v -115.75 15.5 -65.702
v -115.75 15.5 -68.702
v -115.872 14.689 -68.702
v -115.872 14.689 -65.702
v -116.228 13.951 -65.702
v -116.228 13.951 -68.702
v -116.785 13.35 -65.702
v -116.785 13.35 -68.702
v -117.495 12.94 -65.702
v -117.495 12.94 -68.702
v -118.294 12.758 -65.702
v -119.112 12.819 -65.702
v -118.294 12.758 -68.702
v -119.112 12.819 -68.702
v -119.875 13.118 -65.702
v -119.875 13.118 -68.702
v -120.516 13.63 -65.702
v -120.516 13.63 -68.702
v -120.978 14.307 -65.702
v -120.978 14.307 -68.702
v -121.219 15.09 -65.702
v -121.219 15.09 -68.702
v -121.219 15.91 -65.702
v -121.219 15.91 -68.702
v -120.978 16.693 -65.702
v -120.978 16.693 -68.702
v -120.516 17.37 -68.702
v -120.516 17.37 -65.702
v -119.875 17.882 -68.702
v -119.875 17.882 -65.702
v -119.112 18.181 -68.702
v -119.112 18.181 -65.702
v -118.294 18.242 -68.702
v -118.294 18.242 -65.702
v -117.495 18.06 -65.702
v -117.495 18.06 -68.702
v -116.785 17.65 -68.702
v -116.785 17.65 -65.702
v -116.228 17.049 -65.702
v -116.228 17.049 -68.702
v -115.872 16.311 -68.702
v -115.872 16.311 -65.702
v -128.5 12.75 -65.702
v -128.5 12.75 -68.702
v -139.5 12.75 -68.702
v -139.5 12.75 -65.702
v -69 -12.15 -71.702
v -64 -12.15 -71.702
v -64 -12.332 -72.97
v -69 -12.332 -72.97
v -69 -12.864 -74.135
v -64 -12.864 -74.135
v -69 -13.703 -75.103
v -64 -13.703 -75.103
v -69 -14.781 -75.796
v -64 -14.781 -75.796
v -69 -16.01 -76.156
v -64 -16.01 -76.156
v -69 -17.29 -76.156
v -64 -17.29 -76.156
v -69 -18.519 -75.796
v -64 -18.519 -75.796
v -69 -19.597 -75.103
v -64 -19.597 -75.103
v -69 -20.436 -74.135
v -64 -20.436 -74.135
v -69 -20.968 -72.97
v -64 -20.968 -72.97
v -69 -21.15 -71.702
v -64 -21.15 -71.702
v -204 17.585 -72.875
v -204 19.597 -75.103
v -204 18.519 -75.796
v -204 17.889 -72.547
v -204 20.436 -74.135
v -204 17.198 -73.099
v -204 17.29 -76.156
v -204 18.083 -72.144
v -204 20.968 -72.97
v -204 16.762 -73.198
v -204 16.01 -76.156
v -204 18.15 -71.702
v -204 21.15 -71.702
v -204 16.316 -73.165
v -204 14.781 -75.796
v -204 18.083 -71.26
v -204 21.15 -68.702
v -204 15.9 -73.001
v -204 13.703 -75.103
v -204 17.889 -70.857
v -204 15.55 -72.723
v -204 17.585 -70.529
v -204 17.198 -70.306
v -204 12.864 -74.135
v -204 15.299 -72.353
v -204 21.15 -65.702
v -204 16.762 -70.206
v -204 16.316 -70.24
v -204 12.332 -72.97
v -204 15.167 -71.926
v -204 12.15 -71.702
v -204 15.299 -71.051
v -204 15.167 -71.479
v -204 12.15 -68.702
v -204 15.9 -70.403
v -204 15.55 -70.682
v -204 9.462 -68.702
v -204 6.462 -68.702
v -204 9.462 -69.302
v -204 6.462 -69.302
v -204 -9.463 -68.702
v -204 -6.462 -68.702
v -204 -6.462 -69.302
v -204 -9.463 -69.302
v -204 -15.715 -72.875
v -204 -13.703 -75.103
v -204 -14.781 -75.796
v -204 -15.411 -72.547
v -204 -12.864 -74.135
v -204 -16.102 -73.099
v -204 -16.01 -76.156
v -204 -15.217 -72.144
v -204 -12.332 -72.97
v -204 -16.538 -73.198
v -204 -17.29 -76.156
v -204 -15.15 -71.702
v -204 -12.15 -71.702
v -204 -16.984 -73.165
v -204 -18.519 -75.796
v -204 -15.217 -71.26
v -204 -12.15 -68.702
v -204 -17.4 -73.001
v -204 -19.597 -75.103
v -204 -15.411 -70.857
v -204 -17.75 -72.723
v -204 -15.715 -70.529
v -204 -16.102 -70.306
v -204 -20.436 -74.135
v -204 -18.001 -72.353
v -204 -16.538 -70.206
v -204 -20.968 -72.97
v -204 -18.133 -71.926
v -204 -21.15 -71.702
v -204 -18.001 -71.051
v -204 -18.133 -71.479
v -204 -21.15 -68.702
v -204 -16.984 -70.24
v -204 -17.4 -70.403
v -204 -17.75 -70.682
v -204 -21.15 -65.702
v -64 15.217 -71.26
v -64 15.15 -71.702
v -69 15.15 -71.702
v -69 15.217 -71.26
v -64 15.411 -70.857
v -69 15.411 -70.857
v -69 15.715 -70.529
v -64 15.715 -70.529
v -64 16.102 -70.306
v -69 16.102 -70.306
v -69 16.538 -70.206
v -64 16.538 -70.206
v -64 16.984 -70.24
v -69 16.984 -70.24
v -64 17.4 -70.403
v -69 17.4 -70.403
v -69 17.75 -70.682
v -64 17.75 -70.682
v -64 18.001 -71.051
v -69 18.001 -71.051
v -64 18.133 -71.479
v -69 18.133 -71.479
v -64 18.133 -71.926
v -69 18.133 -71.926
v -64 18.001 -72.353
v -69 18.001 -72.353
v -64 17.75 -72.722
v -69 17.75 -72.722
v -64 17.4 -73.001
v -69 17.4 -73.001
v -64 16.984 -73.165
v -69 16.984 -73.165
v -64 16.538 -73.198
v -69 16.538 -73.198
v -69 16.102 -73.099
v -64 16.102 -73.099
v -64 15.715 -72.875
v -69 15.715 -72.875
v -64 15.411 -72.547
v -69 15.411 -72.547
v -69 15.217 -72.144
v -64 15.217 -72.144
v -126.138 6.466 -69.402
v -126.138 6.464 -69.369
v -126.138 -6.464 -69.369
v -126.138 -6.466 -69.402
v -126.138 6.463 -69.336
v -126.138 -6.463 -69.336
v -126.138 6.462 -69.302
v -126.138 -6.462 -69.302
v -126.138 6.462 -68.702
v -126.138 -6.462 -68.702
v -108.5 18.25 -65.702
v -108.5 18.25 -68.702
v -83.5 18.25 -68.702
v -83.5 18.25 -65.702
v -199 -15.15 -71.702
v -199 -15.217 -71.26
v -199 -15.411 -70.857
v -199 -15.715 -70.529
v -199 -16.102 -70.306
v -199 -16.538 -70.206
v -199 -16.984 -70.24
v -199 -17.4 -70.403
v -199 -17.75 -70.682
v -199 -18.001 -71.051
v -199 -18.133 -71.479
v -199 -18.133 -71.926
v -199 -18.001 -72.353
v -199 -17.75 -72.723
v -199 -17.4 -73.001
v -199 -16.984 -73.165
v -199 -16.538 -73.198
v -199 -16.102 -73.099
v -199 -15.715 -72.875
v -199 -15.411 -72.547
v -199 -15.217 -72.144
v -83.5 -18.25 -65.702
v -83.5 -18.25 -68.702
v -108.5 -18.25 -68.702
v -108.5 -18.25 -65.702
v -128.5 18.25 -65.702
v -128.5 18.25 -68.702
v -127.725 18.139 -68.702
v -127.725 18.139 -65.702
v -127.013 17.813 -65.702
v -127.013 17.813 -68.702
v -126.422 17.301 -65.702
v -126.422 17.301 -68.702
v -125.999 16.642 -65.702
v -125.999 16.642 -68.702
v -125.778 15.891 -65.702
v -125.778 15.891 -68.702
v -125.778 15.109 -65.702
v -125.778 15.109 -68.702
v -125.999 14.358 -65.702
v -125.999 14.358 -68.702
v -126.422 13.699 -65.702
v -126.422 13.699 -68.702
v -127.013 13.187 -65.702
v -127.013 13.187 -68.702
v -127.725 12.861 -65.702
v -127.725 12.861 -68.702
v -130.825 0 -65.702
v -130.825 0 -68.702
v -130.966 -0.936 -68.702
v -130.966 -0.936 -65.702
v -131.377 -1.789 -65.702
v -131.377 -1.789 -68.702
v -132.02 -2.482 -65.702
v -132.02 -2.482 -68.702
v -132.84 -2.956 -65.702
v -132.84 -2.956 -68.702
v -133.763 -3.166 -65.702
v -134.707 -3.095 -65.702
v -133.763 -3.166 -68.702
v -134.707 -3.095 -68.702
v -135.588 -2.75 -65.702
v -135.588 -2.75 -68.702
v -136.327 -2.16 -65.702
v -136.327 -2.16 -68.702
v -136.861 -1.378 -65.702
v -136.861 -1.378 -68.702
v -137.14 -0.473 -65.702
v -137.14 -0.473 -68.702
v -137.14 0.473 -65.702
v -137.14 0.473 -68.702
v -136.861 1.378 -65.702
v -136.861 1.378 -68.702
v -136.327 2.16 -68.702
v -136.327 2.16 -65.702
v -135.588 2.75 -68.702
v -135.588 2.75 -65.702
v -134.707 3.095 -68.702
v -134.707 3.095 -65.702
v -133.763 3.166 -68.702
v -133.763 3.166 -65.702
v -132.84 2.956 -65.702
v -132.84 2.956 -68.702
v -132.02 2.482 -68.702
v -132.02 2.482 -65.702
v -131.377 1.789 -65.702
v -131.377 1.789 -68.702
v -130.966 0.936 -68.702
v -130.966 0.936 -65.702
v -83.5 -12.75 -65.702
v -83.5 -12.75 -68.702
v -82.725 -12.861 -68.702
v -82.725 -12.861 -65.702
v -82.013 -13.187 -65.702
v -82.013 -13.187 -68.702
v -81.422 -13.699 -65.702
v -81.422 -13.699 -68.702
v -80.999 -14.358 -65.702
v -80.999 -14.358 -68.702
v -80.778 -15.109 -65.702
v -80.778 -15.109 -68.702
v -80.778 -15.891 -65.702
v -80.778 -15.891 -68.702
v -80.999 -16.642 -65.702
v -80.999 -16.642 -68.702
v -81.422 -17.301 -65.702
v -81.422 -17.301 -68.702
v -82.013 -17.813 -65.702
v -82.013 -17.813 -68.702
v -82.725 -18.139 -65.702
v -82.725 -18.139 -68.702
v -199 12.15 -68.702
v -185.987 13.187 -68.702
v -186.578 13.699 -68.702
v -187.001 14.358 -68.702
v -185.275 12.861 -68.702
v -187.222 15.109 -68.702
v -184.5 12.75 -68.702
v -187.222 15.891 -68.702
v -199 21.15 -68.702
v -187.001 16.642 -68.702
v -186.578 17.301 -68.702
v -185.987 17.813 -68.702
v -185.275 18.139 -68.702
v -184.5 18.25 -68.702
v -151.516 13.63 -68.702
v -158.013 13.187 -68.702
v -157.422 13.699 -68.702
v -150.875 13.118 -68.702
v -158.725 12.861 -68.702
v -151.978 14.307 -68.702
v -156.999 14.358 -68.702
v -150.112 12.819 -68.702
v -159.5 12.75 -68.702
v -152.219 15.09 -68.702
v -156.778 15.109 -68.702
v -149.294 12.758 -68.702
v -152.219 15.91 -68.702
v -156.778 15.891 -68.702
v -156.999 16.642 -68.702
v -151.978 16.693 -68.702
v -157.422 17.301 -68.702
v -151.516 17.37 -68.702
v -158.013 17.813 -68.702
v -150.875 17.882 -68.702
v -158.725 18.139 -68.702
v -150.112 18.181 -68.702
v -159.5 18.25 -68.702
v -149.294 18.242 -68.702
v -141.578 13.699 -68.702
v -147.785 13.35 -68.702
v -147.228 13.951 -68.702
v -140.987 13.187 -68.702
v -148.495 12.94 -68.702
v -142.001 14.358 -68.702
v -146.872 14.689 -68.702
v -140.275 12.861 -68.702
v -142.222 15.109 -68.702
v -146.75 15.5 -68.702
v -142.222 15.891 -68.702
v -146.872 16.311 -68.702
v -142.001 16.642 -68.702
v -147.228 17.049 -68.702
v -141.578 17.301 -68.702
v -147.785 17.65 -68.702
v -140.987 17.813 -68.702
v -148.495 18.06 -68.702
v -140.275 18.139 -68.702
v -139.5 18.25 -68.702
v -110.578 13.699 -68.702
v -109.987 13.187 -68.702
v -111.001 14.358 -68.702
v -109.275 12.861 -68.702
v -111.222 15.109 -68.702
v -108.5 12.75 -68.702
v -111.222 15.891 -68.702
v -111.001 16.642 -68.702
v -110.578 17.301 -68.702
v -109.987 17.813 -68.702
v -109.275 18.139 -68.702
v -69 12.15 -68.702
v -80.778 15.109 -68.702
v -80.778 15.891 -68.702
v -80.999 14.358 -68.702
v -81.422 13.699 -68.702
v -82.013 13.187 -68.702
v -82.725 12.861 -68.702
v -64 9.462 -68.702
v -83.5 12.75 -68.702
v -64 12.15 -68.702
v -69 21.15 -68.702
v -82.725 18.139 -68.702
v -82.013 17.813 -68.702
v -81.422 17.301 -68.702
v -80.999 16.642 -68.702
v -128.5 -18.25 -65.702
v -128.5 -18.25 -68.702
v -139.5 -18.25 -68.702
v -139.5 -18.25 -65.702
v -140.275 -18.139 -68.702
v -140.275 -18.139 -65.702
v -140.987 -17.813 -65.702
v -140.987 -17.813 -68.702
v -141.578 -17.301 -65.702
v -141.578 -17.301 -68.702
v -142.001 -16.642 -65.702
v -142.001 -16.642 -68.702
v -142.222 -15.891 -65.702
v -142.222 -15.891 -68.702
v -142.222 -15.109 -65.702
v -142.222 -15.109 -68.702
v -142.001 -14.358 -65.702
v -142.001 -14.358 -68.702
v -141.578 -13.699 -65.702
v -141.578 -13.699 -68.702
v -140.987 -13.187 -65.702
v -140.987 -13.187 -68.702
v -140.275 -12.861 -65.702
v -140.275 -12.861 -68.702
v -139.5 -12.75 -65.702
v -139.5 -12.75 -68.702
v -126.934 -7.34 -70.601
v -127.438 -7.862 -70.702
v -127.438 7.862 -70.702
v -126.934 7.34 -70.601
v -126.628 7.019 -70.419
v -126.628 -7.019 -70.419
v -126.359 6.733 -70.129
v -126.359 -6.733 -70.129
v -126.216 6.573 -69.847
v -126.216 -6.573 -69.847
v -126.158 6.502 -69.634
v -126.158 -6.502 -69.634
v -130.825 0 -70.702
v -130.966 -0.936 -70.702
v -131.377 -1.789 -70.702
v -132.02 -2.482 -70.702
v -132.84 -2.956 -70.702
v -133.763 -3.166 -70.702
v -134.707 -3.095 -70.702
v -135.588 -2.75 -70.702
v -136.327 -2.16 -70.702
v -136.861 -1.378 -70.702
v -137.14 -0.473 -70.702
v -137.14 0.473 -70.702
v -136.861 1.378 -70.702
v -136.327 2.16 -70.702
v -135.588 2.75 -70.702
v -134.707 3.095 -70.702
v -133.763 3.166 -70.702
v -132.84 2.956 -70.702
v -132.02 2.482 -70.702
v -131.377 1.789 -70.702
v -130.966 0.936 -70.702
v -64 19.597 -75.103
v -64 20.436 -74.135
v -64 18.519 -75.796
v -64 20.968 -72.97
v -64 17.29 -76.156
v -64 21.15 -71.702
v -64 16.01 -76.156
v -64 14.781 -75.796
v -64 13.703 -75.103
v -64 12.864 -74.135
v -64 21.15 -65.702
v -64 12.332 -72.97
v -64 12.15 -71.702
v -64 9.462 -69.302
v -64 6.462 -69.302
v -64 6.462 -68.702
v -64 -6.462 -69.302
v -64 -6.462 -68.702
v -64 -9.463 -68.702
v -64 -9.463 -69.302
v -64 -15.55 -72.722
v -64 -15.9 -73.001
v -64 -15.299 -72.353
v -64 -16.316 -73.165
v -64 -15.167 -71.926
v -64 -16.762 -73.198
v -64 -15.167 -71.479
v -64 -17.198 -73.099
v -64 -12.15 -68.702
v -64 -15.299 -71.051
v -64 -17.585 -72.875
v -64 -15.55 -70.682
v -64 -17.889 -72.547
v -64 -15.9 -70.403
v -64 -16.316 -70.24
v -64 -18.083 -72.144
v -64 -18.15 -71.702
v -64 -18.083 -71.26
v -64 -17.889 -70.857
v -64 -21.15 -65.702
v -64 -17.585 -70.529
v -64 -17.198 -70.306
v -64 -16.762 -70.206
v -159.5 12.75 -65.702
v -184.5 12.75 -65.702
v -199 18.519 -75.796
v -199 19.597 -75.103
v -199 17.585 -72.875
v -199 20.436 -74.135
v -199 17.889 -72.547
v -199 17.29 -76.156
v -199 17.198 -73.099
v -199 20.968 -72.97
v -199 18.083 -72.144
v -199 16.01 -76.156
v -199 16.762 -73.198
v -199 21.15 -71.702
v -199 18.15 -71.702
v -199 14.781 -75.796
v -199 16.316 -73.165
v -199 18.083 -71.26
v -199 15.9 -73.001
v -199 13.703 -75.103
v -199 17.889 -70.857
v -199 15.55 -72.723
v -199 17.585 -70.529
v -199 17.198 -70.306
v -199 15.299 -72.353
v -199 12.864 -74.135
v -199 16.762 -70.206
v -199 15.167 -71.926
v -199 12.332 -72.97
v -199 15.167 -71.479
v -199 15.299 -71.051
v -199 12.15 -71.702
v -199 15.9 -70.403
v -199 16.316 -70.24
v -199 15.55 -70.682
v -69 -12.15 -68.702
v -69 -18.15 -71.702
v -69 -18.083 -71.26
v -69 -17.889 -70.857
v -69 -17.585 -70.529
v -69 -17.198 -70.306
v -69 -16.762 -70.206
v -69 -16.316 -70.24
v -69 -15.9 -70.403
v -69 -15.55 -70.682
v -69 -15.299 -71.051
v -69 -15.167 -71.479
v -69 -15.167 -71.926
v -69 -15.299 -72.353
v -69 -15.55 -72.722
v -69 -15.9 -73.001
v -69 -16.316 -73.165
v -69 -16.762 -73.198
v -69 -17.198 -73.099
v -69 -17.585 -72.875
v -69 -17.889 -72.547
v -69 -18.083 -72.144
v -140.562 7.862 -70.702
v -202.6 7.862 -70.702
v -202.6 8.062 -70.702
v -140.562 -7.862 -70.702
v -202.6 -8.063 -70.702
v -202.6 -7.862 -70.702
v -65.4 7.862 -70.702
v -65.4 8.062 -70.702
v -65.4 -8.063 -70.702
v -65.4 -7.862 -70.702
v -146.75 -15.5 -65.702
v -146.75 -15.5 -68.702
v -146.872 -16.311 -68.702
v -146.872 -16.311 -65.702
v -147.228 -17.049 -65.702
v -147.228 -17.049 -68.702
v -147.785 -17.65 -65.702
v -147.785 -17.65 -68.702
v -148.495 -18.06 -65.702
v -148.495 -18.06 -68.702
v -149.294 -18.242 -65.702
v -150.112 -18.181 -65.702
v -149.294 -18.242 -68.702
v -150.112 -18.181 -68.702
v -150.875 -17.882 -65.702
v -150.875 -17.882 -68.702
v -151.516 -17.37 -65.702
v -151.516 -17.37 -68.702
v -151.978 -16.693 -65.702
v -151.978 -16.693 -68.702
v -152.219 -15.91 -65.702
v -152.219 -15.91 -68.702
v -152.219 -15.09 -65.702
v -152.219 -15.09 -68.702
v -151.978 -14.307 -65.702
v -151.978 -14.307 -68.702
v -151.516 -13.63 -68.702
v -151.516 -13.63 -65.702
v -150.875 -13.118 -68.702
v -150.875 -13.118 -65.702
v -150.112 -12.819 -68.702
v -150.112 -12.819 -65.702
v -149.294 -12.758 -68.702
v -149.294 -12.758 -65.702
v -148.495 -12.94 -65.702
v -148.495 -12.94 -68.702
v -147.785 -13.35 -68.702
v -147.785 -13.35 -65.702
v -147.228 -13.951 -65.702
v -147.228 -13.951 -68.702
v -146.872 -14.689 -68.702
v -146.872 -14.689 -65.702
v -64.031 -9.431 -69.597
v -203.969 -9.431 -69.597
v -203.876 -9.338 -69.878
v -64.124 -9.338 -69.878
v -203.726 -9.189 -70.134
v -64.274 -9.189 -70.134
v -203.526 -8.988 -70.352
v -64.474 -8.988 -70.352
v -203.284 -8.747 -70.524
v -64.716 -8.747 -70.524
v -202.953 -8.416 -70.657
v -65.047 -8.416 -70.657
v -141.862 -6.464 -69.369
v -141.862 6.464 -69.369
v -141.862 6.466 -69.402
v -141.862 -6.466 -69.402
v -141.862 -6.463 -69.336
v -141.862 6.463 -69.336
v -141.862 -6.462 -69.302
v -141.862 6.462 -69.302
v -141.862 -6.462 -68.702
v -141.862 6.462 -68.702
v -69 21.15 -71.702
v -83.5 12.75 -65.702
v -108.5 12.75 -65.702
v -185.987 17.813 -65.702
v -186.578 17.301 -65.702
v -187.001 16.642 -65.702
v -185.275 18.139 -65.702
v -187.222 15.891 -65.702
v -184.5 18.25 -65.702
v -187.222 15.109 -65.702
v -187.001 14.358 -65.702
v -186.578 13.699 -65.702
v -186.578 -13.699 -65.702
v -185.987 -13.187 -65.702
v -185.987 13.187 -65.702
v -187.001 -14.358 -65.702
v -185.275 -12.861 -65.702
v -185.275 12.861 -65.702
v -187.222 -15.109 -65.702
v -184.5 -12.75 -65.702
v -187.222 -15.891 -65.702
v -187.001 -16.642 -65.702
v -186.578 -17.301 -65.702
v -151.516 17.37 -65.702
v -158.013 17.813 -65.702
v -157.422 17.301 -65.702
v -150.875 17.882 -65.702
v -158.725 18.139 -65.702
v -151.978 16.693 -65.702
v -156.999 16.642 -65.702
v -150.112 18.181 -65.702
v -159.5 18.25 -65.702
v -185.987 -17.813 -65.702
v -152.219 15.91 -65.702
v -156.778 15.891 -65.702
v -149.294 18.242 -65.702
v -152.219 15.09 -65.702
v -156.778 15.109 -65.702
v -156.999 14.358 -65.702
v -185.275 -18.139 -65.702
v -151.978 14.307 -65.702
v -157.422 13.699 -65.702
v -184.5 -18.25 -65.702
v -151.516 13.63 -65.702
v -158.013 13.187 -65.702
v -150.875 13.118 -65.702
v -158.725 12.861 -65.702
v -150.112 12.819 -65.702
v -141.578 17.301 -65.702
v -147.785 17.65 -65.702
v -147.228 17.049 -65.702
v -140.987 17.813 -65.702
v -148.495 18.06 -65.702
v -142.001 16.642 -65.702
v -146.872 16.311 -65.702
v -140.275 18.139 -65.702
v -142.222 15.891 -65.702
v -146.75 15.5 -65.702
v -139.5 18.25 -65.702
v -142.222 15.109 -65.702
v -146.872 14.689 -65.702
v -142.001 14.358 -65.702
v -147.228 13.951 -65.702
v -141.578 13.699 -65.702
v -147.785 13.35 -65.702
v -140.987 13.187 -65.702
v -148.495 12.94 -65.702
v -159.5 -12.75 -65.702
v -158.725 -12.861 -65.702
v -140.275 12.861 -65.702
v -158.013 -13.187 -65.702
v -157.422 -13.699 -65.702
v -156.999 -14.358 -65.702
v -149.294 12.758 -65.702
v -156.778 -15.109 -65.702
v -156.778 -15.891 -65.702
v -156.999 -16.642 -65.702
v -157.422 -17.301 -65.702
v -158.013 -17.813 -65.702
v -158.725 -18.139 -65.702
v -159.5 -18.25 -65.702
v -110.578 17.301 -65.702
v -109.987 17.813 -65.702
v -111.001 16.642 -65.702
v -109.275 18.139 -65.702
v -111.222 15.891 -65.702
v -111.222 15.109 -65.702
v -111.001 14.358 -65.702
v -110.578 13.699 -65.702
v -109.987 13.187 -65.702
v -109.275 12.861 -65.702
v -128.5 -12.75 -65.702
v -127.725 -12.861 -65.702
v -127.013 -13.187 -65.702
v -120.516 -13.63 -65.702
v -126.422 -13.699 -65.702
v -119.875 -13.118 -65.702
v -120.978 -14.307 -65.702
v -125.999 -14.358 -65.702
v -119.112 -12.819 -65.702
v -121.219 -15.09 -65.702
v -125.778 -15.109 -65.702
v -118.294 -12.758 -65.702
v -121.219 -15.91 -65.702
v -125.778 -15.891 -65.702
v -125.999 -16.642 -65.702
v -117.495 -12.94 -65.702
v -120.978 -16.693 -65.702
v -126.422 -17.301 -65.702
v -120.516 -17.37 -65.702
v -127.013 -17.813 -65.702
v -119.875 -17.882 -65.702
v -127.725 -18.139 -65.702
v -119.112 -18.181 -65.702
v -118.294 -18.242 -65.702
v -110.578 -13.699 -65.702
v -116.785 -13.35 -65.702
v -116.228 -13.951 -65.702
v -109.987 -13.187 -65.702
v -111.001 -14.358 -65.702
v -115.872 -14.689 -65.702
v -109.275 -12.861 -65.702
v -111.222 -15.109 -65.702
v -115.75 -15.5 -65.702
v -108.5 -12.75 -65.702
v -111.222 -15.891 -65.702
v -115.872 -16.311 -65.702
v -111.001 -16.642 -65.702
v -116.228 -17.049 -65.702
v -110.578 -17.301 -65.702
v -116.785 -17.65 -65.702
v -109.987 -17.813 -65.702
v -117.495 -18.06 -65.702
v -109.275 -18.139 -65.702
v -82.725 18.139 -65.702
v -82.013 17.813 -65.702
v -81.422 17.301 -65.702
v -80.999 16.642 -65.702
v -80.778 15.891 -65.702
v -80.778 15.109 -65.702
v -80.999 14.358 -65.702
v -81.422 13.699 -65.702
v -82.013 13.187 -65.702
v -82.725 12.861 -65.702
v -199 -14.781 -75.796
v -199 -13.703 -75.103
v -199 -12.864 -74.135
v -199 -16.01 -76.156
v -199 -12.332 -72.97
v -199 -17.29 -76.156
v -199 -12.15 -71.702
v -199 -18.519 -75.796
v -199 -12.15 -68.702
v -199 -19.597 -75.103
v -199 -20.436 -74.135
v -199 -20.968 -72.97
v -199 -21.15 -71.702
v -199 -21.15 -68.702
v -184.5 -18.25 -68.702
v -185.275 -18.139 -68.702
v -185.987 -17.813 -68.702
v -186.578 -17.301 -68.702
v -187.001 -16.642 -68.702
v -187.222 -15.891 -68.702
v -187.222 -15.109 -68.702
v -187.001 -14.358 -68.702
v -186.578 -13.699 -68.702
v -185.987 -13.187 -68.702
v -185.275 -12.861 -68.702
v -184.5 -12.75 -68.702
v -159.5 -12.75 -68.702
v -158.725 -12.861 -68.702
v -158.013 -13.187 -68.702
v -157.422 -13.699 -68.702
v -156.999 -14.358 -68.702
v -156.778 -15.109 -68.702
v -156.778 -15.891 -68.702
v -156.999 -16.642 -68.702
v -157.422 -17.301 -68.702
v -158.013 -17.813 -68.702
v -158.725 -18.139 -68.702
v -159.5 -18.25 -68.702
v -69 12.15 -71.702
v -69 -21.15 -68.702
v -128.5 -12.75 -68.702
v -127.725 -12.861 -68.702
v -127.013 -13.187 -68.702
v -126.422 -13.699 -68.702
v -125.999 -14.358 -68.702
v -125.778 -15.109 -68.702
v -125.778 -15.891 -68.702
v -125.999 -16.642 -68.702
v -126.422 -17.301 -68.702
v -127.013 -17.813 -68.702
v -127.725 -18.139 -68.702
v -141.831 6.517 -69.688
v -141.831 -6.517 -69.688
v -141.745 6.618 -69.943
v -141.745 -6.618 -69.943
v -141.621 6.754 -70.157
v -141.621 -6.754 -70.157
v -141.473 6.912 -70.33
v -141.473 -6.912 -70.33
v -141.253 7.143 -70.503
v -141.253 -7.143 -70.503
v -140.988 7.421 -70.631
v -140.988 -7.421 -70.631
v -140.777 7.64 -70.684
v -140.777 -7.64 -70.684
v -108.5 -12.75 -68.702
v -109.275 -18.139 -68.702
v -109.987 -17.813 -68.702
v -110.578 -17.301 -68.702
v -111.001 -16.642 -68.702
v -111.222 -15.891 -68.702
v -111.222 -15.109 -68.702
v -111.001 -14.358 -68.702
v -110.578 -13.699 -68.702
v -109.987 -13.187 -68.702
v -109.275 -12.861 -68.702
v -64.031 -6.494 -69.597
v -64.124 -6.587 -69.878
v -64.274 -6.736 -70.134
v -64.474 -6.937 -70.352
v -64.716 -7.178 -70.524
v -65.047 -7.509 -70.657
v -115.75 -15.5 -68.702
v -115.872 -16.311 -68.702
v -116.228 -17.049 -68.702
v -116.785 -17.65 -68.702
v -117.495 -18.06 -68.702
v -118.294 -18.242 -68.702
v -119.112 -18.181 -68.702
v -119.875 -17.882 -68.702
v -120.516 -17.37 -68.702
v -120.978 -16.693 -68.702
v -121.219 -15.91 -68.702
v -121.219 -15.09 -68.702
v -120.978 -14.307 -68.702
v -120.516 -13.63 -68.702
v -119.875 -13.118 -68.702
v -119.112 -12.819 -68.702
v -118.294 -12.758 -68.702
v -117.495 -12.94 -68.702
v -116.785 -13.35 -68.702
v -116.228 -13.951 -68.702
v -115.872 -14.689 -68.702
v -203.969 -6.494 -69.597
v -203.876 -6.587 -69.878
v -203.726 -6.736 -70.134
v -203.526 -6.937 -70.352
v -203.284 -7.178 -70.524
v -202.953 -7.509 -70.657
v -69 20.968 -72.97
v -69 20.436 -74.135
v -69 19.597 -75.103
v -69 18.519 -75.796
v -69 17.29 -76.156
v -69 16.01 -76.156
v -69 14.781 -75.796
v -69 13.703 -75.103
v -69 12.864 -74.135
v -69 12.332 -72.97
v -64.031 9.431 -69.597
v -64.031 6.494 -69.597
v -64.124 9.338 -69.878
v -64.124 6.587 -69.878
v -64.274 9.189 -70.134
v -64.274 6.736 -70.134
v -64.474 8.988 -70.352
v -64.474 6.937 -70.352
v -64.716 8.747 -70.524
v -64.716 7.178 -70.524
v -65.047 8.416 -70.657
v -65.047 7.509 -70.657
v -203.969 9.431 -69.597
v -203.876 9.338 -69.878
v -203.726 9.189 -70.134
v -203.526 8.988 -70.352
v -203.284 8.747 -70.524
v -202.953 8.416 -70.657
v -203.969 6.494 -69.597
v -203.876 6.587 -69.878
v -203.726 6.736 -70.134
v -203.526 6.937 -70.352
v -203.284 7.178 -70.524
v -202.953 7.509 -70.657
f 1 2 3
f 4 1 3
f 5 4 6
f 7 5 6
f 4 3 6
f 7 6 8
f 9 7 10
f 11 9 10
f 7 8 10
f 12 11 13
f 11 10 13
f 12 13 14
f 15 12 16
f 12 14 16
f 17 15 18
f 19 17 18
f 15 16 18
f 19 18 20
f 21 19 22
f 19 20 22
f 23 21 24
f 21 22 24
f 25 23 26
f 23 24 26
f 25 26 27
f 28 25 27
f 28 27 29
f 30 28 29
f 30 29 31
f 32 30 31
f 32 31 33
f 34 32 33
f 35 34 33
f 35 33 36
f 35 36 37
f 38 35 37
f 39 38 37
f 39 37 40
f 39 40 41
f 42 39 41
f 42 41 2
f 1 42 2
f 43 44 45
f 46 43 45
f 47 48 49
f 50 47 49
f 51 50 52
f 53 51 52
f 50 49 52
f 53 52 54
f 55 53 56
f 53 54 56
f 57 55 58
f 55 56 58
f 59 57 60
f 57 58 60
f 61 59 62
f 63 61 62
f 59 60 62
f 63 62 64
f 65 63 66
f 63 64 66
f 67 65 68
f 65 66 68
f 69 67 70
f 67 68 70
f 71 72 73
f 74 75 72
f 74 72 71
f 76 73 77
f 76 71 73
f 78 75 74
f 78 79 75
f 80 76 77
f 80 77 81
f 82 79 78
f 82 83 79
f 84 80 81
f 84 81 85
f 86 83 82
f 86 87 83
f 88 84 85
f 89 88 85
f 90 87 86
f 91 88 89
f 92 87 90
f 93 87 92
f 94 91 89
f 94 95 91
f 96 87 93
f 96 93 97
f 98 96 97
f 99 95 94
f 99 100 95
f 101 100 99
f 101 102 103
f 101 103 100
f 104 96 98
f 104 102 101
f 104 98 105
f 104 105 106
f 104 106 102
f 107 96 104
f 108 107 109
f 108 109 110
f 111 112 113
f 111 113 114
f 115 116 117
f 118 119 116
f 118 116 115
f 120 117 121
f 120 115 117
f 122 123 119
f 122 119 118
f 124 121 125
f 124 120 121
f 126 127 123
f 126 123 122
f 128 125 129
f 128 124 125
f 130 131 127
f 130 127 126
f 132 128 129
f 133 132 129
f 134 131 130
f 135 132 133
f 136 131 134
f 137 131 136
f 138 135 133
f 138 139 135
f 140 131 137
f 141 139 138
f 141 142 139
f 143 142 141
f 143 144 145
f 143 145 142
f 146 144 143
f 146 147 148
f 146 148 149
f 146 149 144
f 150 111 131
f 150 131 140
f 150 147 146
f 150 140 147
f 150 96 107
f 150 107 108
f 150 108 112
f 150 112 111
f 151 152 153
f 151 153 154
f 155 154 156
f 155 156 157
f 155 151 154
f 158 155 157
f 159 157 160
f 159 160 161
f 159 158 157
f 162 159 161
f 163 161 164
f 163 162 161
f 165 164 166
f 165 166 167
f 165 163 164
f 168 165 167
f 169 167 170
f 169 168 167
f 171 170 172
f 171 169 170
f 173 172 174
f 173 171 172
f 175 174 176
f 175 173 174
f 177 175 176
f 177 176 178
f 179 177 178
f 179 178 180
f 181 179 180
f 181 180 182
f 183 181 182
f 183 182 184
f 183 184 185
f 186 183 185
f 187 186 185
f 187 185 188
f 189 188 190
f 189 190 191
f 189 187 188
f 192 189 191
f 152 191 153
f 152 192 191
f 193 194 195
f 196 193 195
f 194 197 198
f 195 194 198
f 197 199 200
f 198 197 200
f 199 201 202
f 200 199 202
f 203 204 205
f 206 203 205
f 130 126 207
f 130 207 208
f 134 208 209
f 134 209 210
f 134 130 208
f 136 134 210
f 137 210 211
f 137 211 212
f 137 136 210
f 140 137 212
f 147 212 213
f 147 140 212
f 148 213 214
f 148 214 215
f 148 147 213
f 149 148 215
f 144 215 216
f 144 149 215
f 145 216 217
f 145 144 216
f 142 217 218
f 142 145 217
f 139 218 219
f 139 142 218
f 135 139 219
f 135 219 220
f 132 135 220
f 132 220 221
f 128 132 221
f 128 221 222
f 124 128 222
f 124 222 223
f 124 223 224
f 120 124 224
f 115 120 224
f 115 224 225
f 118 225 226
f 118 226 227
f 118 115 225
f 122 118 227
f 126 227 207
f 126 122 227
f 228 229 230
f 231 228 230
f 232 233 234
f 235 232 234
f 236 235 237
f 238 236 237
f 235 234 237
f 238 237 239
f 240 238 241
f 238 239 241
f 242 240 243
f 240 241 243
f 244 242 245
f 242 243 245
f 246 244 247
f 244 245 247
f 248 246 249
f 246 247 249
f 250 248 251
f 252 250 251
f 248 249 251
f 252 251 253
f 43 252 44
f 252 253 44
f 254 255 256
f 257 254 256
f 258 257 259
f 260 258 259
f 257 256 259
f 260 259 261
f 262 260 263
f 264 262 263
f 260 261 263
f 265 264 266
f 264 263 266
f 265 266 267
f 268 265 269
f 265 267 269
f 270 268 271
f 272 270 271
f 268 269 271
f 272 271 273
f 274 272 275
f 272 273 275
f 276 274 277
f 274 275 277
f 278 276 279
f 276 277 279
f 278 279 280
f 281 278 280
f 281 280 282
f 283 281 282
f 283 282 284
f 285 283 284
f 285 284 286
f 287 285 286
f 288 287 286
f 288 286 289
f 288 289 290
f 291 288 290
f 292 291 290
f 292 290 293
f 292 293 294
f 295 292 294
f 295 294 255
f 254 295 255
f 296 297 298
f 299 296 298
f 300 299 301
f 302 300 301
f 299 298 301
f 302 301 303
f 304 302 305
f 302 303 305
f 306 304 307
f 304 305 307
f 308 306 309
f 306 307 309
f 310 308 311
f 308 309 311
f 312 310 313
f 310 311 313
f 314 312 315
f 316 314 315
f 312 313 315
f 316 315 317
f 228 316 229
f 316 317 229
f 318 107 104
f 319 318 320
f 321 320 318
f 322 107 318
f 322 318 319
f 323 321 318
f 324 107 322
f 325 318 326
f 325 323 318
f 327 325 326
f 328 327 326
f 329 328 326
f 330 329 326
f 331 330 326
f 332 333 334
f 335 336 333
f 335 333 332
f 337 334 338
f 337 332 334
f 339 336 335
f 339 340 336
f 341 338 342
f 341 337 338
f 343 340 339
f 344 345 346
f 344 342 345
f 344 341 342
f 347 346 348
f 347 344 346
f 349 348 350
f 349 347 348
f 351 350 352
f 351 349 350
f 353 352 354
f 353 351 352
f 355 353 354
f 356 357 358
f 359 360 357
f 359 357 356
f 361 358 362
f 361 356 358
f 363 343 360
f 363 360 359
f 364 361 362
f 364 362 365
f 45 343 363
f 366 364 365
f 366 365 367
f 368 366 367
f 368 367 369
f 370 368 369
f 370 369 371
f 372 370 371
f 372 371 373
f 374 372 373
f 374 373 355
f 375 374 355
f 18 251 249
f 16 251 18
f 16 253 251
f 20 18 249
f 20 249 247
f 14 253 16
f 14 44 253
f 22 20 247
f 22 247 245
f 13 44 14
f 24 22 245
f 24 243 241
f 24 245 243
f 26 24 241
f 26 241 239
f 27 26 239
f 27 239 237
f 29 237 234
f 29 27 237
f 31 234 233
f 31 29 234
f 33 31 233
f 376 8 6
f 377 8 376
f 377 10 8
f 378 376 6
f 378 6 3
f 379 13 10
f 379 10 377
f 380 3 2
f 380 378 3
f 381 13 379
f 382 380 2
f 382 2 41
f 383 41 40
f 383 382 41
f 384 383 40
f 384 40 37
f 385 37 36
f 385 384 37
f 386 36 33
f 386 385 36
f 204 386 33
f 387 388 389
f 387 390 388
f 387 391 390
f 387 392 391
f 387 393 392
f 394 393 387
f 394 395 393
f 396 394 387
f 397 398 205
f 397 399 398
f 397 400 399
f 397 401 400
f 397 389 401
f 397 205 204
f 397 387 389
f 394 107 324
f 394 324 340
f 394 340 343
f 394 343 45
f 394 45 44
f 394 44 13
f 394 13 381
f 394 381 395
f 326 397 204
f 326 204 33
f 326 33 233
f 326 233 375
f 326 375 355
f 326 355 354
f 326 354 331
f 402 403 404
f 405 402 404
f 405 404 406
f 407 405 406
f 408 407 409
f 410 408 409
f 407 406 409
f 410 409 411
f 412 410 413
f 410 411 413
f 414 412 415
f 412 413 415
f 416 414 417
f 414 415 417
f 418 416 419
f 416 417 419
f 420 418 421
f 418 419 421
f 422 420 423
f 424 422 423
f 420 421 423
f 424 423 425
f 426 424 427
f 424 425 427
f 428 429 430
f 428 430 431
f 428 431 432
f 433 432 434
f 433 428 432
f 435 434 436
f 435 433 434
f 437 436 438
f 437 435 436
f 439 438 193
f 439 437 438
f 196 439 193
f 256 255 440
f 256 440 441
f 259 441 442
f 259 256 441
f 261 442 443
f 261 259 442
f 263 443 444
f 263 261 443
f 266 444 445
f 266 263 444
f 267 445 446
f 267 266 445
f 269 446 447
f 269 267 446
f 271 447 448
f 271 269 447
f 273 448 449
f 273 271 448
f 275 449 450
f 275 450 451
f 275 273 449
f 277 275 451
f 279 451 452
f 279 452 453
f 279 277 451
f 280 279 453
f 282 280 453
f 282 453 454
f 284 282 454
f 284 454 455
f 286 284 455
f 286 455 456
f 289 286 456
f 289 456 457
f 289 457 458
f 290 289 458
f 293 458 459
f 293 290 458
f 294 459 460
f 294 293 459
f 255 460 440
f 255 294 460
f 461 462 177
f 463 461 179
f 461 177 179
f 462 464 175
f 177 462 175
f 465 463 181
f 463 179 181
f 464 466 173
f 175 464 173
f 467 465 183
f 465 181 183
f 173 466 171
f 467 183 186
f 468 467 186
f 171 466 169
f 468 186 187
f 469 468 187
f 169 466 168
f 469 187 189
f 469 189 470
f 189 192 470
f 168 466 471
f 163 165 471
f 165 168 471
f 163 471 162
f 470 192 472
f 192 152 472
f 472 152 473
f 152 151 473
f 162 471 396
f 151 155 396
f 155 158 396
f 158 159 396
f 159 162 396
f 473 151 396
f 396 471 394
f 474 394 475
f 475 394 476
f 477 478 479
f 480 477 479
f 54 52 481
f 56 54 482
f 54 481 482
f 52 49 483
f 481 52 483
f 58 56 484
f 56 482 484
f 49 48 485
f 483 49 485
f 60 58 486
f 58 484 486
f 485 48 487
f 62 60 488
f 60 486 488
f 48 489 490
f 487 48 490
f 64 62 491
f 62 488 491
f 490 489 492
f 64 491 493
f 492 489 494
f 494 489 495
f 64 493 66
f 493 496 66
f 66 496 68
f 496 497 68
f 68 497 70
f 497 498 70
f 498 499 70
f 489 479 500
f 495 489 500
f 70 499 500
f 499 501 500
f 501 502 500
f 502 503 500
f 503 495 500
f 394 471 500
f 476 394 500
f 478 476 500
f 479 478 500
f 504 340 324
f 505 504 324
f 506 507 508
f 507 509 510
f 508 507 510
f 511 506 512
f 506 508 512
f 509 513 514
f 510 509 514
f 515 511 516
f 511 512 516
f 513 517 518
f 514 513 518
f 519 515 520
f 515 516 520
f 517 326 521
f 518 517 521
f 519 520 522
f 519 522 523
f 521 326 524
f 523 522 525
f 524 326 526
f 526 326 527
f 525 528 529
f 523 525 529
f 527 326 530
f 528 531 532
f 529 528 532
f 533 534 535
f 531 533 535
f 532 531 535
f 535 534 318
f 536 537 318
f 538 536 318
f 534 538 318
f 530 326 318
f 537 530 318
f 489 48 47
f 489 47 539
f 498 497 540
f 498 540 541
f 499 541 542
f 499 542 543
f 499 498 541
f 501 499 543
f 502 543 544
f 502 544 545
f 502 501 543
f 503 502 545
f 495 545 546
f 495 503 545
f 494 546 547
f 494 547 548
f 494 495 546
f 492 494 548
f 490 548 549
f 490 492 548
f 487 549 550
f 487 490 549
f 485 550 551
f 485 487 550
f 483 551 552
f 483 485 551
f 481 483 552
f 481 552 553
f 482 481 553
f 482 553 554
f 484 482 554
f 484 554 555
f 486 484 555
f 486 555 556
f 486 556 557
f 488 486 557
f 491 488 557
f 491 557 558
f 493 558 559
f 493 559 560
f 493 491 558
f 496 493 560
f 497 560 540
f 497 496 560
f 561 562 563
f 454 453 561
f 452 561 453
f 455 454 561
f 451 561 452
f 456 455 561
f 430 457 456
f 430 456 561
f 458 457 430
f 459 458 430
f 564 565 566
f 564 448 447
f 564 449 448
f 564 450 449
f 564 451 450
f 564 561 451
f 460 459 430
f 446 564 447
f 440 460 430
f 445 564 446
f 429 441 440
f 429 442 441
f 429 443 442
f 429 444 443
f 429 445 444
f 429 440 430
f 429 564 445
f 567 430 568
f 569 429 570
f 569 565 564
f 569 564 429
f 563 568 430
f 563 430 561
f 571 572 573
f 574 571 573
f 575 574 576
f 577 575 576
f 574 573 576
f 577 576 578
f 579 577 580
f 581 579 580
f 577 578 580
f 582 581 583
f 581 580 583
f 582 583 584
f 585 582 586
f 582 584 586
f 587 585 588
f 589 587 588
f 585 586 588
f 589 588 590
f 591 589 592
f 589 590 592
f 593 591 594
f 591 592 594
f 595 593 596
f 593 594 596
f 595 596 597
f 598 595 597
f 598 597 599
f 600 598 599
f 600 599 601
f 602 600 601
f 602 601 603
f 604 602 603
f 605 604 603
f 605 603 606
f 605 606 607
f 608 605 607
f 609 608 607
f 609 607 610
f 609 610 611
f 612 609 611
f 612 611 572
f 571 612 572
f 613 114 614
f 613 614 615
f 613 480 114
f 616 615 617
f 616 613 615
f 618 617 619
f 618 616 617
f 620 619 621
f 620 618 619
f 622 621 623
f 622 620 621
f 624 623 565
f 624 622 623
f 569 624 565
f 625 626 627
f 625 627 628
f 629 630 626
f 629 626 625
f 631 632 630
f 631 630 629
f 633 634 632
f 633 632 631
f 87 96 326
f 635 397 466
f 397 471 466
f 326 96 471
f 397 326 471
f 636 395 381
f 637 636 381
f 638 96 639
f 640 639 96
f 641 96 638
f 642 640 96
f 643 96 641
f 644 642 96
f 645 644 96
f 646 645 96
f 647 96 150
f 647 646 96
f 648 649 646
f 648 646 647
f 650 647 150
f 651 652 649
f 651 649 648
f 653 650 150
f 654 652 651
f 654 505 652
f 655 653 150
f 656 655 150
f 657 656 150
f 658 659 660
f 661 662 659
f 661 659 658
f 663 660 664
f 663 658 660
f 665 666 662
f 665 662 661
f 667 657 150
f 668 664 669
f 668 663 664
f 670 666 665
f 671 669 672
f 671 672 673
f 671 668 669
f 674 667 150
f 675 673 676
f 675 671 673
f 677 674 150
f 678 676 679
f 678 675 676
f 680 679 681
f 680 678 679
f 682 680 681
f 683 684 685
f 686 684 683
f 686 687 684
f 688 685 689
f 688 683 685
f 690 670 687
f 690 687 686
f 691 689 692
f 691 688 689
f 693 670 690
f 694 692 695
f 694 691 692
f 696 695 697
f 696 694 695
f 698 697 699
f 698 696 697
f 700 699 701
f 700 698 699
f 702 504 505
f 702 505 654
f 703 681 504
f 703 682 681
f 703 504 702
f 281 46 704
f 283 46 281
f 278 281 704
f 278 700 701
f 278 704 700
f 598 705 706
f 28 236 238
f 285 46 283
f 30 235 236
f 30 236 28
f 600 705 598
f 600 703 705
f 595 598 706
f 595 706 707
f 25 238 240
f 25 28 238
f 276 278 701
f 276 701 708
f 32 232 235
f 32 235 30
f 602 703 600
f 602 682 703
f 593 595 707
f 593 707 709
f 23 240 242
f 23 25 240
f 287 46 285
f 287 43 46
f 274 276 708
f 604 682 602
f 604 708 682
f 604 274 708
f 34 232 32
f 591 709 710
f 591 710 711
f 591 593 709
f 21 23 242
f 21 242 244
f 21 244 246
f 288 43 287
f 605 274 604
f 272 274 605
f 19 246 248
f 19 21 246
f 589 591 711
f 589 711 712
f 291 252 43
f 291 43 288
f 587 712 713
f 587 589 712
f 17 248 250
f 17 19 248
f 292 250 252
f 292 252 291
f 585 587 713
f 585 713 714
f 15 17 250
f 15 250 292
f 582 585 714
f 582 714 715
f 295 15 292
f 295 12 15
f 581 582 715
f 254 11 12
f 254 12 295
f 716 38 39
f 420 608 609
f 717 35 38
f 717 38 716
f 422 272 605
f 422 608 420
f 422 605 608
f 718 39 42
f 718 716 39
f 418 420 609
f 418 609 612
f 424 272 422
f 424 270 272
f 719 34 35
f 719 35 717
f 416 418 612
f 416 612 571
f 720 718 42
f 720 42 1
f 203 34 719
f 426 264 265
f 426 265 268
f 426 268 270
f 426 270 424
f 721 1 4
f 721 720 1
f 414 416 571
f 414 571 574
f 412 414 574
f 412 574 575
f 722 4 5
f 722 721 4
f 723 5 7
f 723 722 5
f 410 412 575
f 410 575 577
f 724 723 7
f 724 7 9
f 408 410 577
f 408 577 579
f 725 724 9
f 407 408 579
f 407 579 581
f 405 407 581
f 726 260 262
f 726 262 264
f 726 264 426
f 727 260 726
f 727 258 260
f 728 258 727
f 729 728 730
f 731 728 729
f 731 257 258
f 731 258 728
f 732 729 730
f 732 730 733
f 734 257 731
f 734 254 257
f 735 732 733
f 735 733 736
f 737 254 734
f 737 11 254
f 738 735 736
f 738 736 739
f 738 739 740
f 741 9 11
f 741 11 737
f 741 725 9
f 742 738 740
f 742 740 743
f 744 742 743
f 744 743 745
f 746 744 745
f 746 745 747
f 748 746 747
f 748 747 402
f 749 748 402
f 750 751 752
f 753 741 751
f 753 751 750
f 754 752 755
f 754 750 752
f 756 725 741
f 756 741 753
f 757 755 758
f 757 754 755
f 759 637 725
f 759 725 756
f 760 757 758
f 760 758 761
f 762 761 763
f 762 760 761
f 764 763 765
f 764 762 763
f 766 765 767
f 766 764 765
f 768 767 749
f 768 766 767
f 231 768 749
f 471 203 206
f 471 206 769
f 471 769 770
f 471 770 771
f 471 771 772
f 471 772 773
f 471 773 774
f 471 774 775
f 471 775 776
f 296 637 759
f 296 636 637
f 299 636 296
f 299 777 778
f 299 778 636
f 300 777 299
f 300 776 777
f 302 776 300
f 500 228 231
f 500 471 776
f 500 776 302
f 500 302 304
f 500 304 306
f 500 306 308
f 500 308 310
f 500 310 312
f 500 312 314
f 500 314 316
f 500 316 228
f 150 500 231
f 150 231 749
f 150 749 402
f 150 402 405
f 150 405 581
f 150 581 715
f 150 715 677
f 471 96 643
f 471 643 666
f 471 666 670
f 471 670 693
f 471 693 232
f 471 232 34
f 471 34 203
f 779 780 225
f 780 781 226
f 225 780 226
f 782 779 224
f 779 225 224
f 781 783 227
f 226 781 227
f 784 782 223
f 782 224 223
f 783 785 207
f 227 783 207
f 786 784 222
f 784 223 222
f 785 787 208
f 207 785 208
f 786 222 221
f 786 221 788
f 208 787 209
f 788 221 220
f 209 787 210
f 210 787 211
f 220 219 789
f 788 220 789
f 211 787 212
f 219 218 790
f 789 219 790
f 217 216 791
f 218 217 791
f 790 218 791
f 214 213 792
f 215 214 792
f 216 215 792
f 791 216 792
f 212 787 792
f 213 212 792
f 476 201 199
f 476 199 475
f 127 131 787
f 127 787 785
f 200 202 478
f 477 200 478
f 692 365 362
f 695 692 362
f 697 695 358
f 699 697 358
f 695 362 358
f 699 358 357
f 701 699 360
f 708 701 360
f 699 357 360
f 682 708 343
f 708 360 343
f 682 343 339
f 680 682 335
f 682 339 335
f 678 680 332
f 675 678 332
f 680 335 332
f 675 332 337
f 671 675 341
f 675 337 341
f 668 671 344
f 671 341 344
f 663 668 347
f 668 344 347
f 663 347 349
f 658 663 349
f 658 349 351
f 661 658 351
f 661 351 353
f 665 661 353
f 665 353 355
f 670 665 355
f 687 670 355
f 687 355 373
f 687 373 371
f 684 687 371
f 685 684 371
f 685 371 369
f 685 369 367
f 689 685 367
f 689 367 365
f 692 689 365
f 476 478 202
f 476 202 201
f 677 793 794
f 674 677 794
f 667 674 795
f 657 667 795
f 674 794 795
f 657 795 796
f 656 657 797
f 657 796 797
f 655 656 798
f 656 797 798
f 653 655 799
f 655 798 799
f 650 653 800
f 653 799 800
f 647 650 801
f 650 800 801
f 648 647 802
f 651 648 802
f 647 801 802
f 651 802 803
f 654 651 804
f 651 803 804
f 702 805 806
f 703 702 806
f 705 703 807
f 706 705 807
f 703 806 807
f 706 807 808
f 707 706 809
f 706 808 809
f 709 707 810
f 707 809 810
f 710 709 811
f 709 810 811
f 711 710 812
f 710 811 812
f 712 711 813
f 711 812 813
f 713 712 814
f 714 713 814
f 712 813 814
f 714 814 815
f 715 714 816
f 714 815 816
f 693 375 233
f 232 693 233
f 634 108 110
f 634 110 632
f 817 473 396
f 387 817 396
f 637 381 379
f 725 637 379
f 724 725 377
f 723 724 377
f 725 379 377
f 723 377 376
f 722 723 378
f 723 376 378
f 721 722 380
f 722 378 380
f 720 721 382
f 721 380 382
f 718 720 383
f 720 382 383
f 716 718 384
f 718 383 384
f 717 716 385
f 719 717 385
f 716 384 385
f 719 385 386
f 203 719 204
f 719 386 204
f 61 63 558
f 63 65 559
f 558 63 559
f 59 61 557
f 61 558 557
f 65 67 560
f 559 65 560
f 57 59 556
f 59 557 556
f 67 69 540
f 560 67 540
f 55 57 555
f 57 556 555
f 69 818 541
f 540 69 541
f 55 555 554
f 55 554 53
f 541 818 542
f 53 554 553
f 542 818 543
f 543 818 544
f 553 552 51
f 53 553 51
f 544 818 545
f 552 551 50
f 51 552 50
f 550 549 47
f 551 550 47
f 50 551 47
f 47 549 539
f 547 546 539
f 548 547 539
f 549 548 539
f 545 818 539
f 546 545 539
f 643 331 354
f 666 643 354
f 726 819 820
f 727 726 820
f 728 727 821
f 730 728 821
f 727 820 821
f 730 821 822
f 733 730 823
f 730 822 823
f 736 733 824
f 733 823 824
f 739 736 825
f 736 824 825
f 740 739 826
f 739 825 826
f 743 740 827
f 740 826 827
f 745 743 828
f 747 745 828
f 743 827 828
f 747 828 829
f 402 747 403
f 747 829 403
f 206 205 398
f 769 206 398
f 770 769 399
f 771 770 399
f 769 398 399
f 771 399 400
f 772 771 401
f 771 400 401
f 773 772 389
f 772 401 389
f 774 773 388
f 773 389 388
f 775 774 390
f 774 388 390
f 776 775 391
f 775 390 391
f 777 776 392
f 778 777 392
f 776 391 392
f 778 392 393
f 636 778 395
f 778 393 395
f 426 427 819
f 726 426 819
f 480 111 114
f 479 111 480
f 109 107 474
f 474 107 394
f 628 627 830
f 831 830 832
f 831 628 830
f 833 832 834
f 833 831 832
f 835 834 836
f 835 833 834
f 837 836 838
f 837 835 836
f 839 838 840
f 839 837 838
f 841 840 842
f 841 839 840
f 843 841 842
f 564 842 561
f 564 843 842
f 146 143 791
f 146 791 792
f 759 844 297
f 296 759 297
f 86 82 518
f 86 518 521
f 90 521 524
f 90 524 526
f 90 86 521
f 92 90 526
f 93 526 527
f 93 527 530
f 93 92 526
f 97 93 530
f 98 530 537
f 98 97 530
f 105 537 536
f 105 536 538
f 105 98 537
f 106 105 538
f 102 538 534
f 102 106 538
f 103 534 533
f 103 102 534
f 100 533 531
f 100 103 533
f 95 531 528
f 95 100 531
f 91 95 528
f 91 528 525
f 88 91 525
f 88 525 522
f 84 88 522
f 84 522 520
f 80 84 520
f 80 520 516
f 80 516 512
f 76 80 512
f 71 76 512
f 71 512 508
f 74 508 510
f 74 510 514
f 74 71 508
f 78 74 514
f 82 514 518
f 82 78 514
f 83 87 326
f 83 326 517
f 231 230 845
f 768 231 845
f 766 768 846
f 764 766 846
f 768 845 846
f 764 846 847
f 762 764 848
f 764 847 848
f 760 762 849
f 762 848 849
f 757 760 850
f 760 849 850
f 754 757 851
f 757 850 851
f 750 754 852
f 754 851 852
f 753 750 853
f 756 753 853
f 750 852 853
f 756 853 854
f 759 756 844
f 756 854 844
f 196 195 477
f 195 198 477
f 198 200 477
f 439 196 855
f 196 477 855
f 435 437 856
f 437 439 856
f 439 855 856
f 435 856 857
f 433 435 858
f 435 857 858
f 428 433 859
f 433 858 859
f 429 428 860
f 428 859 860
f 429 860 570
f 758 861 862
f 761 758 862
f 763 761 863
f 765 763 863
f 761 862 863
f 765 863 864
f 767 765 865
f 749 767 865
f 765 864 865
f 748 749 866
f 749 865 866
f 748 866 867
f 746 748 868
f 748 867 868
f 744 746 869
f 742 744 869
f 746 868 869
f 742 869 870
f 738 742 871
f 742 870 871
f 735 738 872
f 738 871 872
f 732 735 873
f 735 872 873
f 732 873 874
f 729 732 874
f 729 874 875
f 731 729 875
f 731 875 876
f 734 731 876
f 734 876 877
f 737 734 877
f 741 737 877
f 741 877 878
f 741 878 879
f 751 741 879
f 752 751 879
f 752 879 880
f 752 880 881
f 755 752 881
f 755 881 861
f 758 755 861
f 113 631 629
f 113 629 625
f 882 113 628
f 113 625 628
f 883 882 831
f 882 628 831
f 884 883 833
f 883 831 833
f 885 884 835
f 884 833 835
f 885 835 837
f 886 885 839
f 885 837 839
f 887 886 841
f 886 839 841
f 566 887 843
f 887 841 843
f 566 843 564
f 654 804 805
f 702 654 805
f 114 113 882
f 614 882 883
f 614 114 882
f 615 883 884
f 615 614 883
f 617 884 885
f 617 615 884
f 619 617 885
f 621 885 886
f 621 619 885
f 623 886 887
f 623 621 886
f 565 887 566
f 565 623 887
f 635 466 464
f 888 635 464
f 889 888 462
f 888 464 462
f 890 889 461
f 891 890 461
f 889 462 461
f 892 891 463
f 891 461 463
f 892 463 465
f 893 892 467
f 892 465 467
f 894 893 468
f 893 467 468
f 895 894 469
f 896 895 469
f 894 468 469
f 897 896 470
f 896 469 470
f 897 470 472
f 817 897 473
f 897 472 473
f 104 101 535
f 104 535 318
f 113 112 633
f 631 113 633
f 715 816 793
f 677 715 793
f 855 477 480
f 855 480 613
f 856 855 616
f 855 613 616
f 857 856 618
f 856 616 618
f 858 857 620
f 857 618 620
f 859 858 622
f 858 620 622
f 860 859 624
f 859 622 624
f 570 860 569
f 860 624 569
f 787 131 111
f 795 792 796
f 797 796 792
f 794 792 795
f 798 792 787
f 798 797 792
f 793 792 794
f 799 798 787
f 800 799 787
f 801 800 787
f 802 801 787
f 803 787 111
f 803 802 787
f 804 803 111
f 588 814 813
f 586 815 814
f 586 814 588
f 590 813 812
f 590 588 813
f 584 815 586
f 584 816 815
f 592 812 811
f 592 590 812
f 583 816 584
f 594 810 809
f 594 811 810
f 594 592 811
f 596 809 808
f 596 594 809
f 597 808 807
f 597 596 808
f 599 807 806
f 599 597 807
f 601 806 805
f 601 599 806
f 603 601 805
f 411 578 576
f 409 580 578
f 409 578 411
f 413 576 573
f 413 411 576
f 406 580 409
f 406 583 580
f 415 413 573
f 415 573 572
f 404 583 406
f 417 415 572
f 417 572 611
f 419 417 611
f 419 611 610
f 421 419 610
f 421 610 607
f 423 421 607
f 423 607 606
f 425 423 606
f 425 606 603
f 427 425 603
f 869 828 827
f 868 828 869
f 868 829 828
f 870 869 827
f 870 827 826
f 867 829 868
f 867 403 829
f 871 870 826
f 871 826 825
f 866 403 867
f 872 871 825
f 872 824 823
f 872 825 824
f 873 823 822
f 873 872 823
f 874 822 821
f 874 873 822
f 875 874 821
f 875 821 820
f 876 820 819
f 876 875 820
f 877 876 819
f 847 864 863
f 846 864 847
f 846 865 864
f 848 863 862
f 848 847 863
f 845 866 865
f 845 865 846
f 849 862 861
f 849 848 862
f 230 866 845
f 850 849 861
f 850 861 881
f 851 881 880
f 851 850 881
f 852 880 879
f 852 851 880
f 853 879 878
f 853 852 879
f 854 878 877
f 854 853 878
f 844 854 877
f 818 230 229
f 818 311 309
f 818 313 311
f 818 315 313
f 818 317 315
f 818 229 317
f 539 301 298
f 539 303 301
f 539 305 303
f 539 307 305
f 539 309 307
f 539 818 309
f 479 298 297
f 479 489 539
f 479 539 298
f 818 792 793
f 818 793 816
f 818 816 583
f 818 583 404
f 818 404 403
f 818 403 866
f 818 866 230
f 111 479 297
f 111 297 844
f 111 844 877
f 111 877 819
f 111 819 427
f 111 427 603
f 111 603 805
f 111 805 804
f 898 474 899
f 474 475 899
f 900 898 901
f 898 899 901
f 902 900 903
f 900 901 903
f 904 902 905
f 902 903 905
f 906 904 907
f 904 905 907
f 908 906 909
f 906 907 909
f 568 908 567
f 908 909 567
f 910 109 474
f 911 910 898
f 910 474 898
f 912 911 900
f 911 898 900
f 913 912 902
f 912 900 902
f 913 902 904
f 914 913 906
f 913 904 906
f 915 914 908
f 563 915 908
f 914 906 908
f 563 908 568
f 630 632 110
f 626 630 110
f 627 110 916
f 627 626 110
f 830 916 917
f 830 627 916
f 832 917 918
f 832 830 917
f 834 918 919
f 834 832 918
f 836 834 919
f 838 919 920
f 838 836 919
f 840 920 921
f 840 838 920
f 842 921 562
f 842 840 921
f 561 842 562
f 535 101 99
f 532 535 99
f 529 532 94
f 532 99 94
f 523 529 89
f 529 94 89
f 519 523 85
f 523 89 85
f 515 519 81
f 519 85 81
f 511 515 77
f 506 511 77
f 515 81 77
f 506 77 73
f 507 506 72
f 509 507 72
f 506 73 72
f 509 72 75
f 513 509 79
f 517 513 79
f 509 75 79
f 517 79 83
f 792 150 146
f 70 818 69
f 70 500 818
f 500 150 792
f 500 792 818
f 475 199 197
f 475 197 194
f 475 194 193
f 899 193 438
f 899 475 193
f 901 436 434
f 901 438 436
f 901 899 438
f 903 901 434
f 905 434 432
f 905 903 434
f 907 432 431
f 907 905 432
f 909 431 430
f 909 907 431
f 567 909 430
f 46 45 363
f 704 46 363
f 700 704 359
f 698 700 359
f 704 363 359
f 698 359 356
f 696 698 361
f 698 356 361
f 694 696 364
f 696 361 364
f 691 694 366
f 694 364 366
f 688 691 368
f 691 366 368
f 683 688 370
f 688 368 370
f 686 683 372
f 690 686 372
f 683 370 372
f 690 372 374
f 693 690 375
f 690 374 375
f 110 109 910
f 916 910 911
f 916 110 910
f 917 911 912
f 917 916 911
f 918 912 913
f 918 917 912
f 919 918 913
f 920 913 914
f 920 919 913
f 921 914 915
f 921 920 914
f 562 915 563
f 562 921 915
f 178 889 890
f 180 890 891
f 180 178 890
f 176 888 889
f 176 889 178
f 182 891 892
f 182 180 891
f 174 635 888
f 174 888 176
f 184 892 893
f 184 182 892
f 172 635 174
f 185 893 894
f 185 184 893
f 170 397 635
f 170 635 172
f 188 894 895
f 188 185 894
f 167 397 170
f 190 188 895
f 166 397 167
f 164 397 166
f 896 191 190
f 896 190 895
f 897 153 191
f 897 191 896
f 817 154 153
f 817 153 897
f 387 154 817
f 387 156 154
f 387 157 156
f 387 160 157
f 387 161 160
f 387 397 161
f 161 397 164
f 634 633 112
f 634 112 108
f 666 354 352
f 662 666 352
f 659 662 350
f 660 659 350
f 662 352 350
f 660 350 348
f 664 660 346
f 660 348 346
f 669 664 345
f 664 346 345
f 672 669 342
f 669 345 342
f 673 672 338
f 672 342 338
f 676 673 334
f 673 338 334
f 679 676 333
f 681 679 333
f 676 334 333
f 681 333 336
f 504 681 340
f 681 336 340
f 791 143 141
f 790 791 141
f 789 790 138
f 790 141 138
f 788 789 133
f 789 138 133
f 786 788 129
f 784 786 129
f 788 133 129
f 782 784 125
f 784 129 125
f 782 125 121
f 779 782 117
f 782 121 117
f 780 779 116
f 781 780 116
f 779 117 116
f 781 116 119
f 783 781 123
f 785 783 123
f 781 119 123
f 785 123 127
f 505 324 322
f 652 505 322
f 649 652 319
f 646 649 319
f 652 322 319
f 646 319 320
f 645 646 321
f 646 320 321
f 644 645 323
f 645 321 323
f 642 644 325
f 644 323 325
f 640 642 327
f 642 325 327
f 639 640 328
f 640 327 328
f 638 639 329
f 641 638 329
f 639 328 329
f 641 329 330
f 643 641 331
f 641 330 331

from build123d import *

# Parameters (mm, degrees)
SKETCH074_W     = 42.3
SKETCH074_H     = 3
SKETCH075_W     = 42.3
SKETCH075_H     = 3
SKETCH076_R     = 1.5
PAD030_DEPTH    = 5
SKETCH033_R     = 1.5000289281
SKETCH033_R_2   = 1.500028928
PAD031_DEPTH    = 5
SKETCH078_R     = 2.75
SKETCH078_R_2   = 3.175
POCKET020_DEPTH = 5
SKETCH084_W     = 140
SKETCH084_H     = 3.0000000001
SKETCH084_H_2   = 3
PAD034_DEPTH    = 2
FILLET005_R     = 1.4
SKETCH088_W     = 15.725
SKETCH088_H     = 15.725
SKETCH088_R     = 3.175
PAD036_DEPTH    = 2
FILLET006_R     = 1.3


with BuildPart() as part:
    # Sketch074 (on Face1 of Binder022) → AdditiveLoft005 section 0
    with BuildSketch(Plane.YZ.offset(-204)):
        with Locations((0, -67.2022145348)):
            Rectangle(SKETCH074_W, SKETCH074_H)
    # Sketch075 (on Face1 of Binder023) → AdditiveLoft005 section 1
    with BuildSketch(Plane(origin=(-64, 0, 0), x_dir=(0, -1, 0), z_dir=(-1, 0, 0))):
        with Locations((0, -67.2022145348)):
            Rectangle(SKETCH075_W, SKETCH075_H)
    loft()

    # Sketch076 (on Face1 of Binder023) → Pad030 (new body)
    with BuildSketch(Plane(origin=(-64, 0, 0), x_dir=(0, -1, 0), z_dir=(-1, 0, 0))):
        with BuildLine():
            Line((-12.15, -71.7022145347), (-12.15, -68.7022145348))
            Line((-12.15, -68.7022145348), (-21.15, -68.7022145348))
            Line((-21.15, -68.7022145348), (-21.15, -71.7022145347))
            ThreePointArc((-21.15, -71.7022145347), (-16.65, -76.2022145528), (-12.15, -71.7022145347))
        make_face()
        with Locations((-16.65, -71.7022145528)):
            Circle(SKETCH076_R, mode=Mode.SUBTRACT)
        with BuildLine():
            Line((12.15, -71.7022145347), (12.15, -68.7022145348))
            Line((12.15, -68.7022145348), (21.15, -68.7022145348))
            Line((21.15, -68.7022145348), (21.15, -71.7022145347))
            ThreePointArc((12.15, -71.7022145347), (16.65, -76.20221451), (21.15, -71.7022145347))
        make_face()
        with Locations((16.65, -71.70221451)):
            Circle(SKETCH076_R, mode=Mode.SUBTRACT)
    extrude(amount=PAD030_DEPTH)

    # Sketch033 (on Face1 of Binder022) → Pad031 (join)
    with BuildSketch(Plane.YZ.offset(-204)):
        with BuildLine():
            Line((-21.1499999998, -71.7022145347), (-21.15, -68.7022145348))
            Line((-21.15, -68.7022145348), (-12.15, -68.7022145348))
            Line((-12.15, -68.7022145348), (-12.1500000002, -71.7022145347))
            ThreePointArc((-21.1499999998, -71.7022145347), (-16.65, -76.2022525186), (-12.1500000002, -71.7022145347))
        make_face()
        with Locations((-16.65, -71.7022434628)):
            Circle(SKETCH033_R, mode=Mode.SUBTRACT)
        with BuildLine():
            Line((12.1500000002, -71.7022145347), (12.15, -68.7022145348))
            Line((12.15, -68.7022145348), (21.15, -68.7022145348))
            Line((21.15, -68.7022145348), (21.1499999998, -71.7022145347))
            ThreePointArc((12.1500000002, -71.7022145347), (16.65, -76.2022525185), (21.1499999998, -71.7022145347))
        make_face()
        with Locations((16.65, -71.7022434628)):
            Circle(SKETCH033_R_2, mode=Mode.SUBTRACT)
    extrude(amount=PAD031_DEPTH)

    # Sketch078 (on Face5 of Pad031) → Pocket020 (cut)
    with BuildSketch(Plane(origin=(0, 0, -68.7022145348), x_dir=(1, 0, 0), z_dir=(0, 0, -1))):
        with Locations((-149.5, 15.5)):
            Circle(SKETCH078_R)
        with Locations((-118.5, 15.5)):
            Circle(SKETCH078_R)
        with Locations((-118.5, -15.5)):
            Circle(SKETCH078_R)
        with Locations((-149.5, -15.5)):
            Circle(SKETCH078_R)
        with Locations((-134, 0)):
            Circle(SKETCH078_R_2)
        with BuildLine():
            ThreePointArc((-159.5, 12.75), (-156.75, 15.5), (-159.5, 18.25))
            Line((-159.5, 18.25), (-184.5, 18.25))
            ThreePointArc((-184.5, 18.25), (-187.25, 15.5), (-184.5, 12.75))
            Line((-184.5, 12.75), (-159.5, 12.75))
        make_face()
        with BuildLine():
            ThreePointArc((-159.5, -18.25), (-156.75, -15.5), (-159.5, -12.75))
            Line((-159.5, -12.75), (-184.5, -12.75))
            ThreePointArc((-184.5, -12.75), (-187.25, -15.5), (-184.5, -18.25))
            Line((-184.5, -18.25), (-159.5, -18.25))
        make_face()
        with BuildLine():
            ThreePointArc((-108.5, -12.75), (-111.25, -15.5), (-108.5, -18.25))
            Line((-108.5, -18.25), (-83.5, -18.25))
            ThreePointArc((-83.5, -18.25), (-80.75, -15.5), (-83.5, -12.75))
            Line((-83.5, -12.75), (-108.5, -12.75))
        make_face()
        with BuildLine():
            ThreePointArc((-108.5, 18.25), (-111.25, 15.5), (-108.5, 12.75))
            Line((-108.5, 12.75), (-83.5, 12.75))
            ThreePointArc((-83.5, 12.75), (-80.75, 15.5), (-83.5, 18.25))
            Line((-83.5, 18.25), (-108.5, 18.25))
        make_face()
        with BuildLine():
            ThreePointArc((-128.5, 12.75), (-125.75, 15.5), (-128.5, 18.25))
            Line((-128.5, 18.25), (-139.5, 18.25))
            ThreePointArc((-139.5, 18.25), (-142.25, 15.5), (-139.5, 12.75))
            Line((-139.5, 12.75), (-128.5, 12.75))
        make_face()
        with BuildLine():
            ThreePointArc((-139.5, -12.75), (-142.25, -15.5), (-139.5, -18.25))
            Line((-139.5, -18.25), (-128.5, -18.25))
            ThreePointArc((-128.5, -18.25), (-125.75, -15.5), (-128.5, -12.75))
            Line((-128.5, -12.75), (-139.5, -12.75))
        make_face()
    extrude(amount=-POCKET020_DEPTH, mode=Mode.SUBTRACT)

    # Sketch084 (on Face5 of Pocket020) → Pad034 (join)
    with BuildSketch(Plane(origin=(0, 0, -68.7022145348), x_dir=(1, 0, 0), z_dir=(0, 0, -1))):
        with Locations((-134, 7.9625)):
            Rectangle(SKETCH084_W, SKETCH084_H)
        with Locations((-134, -7.9625)):
            Rectangle(SKETCH084_W, SKETCH084_H_2)
    extrude(amount=PAD034_DEPTH)

    # Fillet005
    fillet005_edges = [part.edges().sort_by_distance(p)[0] for p in [
        (-134, -9.4625, -70.702215),
        (-64, -7.9625, -70.702215),
        (-134, -6.4625, -70.702215),
        (-204, -7.9625, -70.702215),
        (-134, 6.4625, -70.702215),
        (-204, 7.9625, -70.702215),
        (-134, 9.4625, -70.702215),
        (-64, 7.9625, -70.702215),
    ]]
    fillet(fillet005_edges, radius=FILLET005_R)

    # Sketch088 (on Face8 of Fillet005) → Pad036 (join)
    with BuildSketch(Plane(origin=(0, 0, -68.7022145348), x_dir=(1, 0, 0), z_dir=(0, 0, -1))):
        with Locations((-134, 0)):
            Rectangle(SKETCH088_W, SKETCH088_H)
        with Locations((-134, 0)):
            Circle(SKETCH088_R, mode=Mode.SUBTRACT)
    extrude(amount=PAD036_DEPTH)

    # Fillet006
    fillet006_edges = [part.edges().sort_by_distance(p)[0] for p in [
        (-126.1375, 0, -70.702215),
        (-141.8625, 0, -70.702215),
    ]]
    fillet(fillet006_edges, radius=FILLET006_R)


solid = part.part
